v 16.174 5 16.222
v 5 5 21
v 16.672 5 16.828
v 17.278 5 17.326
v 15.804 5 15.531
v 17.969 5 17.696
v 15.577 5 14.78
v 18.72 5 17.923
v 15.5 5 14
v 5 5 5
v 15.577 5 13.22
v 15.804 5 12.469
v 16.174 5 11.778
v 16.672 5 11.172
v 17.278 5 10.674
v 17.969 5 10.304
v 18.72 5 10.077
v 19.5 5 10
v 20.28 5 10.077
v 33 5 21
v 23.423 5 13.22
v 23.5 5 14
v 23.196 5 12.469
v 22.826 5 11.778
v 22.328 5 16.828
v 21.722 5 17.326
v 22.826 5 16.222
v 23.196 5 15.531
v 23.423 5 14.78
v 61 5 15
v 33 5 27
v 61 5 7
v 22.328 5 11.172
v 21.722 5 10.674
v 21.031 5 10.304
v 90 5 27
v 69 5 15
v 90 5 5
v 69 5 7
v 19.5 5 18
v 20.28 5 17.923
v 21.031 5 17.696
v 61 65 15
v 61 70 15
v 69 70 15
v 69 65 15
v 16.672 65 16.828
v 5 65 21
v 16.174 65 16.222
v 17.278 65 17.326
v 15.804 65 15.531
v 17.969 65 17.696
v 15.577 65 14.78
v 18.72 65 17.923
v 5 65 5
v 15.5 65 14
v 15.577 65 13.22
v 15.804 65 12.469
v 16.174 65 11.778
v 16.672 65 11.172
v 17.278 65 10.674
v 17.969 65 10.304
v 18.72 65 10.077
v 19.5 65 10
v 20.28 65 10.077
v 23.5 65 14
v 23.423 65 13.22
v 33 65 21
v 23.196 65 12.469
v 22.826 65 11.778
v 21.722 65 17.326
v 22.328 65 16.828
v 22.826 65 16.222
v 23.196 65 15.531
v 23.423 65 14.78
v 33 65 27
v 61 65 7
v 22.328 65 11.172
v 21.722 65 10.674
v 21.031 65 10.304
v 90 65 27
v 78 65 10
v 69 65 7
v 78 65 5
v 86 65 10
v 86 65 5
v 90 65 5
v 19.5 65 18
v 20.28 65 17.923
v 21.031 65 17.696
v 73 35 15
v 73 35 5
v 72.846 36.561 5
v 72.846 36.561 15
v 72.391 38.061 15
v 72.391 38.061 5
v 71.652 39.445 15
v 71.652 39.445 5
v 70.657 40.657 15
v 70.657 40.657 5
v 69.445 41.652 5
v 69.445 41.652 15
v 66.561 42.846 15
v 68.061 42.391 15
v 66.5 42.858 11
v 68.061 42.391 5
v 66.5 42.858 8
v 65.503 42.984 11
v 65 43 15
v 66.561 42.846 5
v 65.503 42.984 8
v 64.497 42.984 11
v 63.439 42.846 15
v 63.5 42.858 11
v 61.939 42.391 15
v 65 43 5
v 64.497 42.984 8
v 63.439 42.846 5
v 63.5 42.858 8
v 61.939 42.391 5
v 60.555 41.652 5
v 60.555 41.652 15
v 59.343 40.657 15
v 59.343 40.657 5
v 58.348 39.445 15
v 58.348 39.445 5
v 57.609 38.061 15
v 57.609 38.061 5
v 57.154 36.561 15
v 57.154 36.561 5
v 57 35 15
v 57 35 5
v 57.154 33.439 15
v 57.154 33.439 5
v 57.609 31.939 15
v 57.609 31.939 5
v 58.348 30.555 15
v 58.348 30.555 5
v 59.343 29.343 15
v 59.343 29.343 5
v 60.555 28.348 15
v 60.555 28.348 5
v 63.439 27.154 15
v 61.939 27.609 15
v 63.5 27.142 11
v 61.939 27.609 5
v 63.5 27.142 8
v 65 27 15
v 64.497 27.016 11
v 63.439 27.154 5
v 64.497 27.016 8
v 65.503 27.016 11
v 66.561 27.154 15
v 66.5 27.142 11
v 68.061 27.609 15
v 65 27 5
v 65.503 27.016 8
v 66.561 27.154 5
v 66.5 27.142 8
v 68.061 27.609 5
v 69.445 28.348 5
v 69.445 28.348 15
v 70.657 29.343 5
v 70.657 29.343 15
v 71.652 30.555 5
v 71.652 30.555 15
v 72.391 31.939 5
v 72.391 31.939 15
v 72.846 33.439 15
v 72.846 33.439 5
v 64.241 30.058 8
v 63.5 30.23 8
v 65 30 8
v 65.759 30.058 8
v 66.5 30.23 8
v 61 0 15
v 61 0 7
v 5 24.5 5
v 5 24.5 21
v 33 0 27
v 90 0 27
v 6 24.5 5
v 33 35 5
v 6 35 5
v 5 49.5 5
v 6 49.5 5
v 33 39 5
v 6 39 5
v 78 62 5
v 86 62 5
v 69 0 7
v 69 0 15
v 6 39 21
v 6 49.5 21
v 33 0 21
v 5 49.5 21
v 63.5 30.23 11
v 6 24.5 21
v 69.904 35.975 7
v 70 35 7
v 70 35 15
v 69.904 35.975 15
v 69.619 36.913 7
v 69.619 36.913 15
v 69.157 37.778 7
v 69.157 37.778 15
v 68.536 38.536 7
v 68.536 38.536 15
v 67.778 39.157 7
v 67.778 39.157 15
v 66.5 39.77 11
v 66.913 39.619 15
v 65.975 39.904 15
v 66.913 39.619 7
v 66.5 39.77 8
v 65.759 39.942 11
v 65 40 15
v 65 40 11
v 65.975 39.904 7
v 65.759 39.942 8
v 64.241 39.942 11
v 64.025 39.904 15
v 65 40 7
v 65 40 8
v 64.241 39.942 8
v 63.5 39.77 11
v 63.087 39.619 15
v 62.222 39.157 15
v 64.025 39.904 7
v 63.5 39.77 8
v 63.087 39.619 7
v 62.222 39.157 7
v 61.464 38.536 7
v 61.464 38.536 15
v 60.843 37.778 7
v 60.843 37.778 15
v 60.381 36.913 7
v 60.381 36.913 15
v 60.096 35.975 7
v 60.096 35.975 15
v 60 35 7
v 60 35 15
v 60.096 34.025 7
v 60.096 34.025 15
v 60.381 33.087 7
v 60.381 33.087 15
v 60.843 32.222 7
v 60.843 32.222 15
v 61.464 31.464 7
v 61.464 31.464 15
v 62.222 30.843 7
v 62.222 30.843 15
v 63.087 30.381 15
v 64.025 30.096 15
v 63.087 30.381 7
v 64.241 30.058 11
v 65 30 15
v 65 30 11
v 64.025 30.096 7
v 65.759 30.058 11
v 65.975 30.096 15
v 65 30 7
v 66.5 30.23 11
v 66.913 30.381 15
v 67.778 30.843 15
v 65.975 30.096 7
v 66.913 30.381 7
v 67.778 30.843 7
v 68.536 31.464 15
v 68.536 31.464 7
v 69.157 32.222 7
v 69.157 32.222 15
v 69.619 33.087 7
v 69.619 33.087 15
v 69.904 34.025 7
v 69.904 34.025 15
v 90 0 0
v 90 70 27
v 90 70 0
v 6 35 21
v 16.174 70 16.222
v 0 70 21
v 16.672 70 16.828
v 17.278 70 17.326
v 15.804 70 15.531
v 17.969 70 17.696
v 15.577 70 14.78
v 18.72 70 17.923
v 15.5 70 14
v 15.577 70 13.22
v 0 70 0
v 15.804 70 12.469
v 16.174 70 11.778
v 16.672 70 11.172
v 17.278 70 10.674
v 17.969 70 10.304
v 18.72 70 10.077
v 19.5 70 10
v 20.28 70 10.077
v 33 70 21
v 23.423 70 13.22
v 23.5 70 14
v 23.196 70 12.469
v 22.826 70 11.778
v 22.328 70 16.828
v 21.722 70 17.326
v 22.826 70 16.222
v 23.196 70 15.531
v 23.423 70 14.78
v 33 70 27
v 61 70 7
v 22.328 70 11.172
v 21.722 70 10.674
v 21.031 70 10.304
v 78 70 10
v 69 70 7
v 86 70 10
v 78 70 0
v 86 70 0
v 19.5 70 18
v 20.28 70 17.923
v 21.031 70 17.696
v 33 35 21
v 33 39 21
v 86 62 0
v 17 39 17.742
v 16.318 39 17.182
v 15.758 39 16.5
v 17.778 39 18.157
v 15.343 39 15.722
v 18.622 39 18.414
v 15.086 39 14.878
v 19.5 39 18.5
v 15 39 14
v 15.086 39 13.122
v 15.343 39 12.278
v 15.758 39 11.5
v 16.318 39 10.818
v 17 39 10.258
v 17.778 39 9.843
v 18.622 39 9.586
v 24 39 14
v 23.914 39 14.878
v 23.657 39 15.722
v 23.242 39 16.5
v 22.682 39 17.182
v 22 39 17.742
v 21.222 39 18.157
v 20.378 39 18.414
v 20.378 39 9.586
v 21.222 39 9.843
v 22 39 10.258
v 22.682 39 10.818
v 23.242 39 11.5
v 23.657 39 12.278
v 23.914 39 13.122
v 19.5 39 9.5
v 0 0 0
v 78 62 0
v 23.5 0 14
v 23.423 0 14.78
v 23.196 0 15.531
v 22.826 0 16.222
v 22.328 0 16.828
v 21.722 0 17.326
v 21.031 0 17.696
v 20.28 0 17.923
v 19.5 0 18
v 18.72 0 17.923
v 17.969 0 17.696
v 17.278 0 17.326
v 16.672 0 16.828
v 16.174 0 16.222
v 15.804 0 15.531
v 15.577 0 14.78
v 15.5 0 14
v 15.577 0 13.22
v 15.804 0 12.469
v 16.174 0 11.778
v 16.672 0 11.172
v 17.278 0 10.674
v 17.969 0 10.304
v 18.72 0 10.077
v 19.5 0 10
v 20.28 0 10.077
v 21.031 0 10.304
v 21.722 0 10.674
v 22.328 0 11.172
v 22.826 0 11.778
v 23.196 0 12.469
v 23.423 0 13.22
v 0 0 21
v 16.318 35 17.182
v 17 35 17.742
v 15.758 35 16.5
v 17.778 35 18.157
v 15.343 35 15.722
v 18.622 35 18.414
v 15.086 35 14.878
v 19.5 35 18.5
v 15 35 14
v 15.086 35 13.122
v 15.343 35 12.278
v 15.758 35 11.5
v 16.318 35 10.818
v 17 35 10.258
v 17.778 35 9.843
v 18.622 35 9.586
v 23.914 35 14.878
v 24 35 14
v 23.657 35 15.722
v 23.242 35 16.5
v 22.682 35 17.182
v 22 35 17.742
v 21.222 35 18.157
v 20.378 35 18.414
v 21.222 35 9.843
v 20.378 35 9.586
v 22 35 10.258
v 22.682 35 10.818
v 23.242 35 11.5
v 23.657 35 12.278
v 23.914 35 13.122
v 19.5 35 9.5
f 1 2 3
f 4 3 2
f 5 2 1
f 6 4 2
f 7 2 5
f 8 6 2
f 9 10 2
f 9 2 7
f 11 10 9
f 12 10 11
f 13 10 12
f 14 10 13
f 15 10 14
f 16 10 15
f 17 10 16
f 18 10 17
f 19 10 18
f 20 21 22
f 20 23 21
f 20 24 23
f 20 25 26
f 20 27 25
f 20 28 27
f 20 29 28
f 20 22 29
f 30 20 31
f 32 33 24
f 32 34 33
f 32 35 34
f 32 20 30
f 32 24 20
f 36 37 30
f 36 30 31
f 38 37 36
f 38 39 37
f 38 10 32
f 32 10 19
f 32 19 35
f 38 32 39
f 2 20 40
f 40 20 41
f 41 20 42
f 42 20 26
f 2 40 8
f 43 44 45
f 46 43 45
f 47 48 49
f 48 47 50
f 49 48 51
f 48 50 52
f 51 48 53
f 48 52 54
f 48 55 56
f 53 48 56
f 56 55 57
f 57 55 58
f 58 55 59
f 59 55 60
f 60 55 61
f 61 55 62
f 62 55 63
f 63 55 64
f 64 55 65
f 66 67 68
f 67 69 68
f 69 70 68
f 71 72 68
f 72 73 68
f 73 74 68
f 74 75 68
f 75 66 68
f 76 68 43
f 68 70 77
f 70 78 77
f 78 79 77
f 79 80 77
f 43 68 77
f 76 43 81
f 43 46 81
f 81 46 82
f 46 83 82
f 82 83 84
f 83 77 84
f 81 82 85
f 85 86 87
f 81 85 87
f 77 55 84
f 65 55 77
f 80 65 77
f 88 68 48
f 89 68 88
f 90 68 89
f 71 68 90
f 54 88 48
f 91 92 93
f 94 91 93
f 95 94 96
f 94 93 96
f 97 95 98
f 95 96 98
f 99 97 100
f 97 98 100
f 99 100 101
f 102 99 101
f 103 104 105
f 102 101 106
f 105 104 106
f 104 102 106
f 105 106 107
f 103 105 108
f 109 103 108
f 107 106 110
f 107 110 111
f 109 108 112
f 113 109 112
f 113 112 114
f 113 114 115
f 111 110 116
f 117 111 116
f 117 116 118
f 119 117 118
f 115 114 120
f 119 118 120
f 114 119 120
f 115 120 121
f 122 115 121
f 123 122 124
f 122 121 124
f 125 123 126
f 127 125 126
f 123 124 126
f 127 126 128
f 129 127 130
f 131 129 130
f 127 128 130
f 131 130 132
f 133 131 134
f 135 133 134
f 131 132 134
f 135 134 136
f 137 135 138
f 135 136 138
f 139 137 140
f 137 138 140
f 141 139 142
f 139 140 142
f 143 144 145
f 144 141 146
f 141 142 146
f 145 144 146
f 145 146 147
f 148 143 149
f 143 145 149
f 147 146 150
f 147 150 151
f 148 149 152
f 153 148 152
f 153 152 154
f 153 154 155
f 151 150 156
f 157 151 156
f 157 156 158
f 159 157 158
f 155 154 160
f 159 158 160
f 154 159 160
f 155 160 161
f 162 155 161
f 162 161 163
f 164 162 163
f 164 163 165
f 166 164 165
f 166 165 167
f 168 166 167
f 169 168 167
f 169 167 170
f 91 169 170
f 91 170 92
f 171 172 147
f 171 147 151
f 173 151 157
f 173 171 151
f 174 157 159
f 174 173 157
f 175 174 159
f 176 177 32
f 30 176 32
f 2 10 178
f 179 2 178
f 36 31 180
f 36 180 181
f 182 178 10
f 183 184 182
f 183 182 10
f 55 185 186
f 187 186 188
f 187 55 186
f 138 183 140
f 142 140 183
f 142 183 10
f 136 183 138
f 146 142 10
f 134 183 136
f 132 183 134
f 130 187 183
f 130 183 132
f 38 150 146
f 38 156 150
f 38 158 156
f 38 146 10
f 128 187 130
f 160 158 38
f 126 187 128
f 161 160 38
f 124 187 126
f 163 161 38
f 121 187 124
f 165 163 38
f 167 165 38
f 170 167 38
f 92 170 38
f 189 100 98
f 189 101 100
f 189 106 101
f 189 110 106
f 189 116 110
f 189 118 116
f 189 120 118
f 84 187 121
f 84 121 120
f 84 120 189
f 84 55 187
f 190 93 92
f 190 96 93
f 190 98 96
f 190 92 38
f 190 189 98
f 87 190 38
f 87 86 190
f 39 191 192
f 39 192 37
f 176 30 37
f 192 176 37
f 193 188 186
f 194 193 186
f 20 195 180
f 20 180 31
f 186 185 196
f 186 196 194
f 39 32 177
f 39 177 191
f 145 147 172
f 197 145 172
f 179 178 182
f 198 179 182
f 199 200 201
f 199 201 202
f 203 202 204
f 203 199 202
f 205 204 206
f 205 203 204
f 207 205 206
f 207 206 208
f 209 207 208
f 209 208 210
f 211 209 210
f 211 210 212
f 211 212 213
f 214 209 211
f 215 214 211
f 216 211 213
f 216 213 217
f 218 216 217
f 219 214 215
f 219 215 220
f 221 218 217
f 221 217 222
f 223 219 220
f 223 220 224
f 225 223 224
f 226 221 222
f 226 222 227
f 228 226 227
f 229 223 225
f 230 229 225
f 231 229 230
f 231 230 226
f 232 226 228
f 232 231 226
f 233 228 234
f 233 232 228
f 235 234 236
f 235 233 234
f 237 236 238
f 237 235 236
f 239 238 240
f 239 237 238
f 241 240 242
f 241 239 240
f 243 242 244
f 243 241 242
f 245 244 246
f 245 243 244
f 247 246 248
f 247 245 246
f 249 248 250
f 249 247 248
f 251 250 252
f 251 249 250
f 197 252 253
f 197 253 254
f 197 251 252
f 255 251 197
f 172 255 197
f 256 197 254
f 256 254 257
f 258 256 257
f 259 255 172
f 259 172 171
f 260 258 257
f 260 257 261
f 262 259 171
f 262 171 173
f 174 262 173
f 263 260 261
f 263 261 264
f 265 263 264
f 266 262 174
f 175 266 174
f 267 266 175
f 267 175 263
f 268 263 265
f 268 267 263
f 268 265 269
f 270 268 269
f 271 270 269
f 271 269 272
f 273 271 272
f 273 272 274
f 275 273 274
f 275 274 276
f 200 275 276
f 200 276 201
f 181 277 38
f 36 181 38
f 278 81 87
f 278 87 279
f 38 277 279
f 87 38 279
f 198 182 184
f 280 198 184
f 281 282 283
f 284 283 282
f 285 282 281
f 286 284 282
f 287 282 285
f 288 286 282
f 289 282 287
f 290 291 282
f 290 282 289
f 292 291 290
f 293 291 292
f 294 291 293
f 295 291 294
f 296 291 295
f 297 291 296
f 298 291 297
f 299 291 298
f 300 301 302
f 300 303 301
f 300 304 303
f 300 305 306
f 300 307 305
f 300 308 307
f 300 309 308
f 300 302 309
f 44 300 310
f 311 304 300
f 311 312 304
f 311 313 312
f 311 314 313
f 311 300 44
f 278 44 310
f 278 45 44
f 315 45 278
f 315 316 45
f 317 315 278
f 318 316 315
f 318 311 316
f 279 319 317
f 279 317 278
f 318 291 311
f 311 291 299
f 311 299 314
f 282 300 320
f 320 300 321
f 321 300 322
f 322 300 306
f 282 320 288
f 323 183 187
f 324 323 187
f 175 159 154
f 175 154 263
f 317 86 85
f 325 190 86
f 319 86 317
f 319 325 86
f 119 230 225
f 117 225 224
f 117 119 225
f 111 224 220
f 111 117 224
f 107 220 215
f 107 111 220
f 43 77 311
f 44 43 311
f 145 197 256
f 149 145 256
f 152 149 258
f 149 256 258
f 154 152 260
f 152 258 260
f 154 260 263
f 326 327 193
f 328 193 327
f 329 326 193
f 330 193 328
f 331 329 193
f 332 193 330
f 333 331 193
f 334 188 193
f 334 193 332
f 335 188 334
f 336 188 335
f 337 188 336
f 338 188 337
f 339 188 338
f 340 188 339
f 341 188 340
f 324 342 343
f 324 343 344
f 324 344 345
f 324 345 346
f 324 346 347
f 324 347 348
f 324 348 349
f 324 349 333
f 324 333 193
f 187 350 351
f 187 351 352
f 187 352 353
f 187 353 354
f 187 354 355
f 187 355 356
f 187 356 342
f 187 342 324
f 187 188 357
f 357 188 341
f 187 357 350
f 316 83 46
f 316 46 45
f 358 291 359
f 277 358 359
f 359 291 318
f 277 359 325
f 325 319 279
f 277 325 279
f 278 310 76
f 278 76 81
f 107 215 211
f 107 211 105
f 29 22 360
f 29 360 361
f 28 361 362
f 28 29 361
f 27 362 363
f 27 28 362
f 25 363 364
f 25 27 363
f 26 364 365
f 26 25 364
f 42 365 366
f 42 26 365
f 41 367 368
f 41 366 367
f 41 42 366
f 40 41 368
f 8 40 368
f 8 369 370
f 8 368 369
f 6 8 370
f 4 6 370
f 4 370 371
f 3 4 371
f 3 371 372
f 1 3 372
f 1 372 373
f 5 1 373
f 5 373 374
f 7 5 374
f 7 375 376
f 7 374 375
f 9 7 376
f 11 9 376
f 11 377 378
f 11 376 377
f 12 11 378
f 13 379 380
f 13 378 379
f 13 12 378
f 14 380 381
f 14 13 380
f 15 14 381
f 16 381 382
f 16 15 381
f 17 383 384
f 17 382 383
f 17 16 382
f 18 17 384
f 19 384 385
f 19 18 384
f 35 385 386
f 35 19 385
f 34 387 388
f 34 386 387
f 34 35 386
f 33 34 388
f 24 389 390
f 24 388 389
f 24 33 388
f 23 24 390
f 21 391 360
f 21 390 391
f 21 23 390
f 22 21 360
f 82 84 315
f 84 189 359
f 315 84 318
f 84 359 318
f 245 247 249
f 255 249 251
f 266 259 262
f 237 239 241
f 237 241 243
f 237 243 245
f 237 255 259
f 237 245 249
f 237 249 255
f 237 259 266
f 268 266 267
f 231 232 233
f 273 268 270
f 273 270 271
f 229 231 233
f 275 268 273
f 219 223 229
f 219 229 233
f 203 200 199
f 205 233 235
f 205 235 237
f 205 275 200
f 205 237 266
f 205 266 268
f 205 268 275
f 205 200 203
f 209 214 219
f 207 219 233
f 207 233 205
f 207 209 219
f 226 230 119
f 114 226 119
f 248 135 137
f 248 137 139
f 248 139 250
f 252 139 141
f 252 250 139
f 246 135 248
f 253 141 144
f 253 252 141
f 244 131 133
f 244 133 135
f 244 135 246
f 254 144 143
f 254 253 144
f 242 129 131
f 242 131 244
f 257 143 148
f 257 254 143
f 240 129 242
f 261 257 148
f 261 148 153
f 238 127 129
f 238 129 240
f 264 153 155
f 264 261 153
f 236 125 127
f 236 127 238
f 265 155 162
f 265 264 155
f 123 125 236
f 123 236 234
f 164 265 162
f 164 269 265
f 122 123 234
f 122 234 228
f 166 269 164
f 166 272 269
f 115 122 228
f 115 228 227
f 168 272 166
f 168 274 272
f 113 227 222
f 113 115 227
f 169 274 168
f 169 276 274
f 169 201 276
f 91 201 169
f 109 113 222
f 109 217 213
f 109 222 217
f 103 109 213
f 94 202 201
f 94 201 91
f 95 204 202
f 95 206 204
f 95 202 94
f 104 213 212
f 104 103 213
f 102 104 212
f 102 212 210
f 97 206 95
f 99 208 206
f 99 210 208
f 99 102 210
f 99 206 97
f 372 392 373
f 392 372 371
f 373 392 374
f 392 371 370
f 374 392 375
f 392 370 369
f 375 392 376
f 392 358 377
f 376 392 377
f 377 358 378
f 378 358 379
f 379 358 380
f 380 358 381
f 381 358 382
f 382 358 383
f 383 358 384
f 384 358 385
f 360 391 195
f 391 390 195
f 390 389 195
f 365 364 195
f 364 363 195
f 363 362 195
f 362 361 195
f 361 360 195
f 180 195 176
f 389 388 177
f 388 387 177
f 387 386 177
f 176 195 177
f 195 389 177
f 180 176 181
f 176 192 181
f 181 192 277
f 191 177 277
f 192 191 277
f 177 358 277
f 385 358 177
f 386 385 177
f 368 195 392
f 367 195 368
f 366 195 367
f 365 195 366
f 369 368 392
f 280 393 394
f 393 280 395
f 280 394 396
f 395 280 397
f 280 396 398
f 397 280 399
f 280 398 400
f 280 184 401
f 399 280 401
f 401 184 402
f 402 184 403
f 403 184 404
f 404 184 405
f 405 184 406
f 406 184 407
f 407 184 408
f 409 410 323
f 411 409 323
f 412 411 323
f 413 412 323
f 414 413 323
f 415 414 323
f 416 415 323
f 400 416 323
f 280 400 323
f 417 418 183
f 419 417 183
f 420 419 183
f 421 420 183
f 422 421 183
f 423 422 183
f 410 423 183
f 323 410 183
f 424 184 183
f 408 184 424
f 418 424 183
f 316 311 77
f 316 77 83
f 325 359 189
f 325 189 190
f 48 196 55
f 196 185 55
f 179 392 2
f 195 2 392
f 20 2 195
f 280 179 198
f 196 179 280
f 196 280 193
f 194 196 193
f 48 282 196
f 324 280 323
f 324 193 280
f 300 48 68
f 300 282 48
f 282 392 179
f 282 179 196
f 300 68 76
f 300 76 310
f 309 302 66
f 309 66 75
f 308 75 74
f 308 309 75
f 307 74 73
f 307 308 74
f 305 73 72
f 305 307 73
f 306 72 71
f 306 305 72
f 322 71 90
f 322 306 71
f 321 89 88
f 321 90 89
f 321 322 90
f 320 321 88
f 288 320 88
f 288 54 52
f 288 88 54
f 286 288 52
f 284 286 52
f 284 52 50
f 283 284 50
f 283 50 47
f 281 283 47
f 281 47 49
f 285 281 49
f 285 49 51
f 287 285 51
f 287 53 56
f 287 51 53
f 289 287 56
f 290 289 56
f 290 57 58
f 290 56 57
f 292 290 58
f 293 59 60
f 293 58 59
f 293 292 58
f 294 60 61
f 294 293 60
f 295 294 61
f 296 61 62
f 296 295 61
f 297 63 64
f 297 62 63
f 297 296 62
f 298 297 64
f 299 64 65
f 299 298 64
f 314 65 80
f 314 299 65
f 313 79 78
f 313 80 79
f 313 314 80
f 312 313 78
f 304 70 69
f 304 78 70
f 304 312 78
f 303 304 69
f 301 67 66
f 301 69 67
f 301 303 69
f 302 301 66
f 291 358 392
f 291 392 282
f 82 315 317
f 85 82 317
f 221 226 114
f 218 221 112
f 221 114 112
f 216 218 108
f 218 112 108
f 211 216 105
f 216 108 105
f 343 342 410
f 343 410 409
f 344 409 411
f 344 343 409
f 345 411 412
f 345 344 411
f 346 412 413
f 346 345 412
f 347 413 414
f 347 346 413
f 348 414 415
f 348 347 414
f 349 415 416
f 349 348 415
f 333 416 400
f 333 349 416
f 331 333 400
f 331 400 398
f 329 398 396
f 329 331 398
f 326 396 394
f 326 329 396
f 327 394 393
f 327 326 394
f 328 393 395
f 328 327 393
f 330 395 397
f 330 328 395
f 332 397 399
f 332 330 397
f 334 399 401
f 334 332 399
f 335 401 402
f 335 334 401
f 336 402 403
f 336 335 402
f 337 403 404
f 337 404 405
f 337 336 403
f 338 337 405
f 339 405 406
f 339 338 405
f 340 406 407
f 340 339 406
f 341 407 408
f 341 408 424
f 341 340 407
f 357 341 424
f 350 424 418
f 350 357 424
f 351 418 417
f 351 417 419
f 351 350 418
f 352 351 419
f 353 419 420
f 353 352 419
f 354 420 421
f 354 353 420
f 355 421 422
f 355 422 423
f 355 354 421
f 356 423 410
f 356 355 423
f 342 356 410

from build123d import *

# Parameters (mm, degrees)
BOX020_W          = 33
BOX020_H          = 70
BOX020_DEPTH      = 6
CYLINDER002_R     = 4.5
CYLINDER002_DEPTH = 4
BOX004_W          = 27
BOX004_H          = 4
BOX004_DEPTH      = 18
BOX005_W          = 4
BOX005_H          = 25
BOX005_DEPTH      = 18
BOX001_W          = 85
BOX001_H          = 60
BOX001_DEPTH      = 22
BOX008_W          = 8
BOX008_H          = 8
BOX008_DEPTH      = 10
BOX015_W          = 8
BOX015_H          = 5
BOX015_DEPTH      = 8
BOX016_W          = 8
BOX016_H          = 5
BOX016_DEPTH      = 8
CYLINDER_R        = 4
CYLINDER_DEPTH    = 84
BOX_W             = 90
BOX_H             = 70
BOX_DEPTH         = 27
CYLINDER005_R     = 5
CYLINDER005_DEPTH = 8
BOX009_W          = 3
BOX009_H          = 16
BOX009_DEPTH      = 3
CYLINDER004_R     = 8
CYLINDER004_DEPTH = 10


with BuildPart() as bottompedalhingecutout:
    # Box020 → Box020 (new body)
    with BuildSketch(Plane.XY.offset(21)):
        with Locations((16.5, 35)):
            Rectangle(BOX020_W, BOX020_H)
    extrude(amount=BOX020_DEPTH)


with BuildPart() as potentiometermountinghole:
    # Cylinder002 → Cylinder002 (new body)
    with BuildSketch(Plane(origin=(19.5, 39, 14), x_dir=(1, 0, 0), z_dir=(0, -1, 0))):
        Circle(CYLINDER002_R)
    extrude(amount=CYLINDER002_DEPTH)


with BuildPart() as potentiometerplate:
    # Box004 → Box004 (new body)
    with BuildSketch(Plane(origin=(6, 35, 5), x_dir=(1, 0, 0), z_dir=(0, 0, 1))):
        with Locations((13.5, 2)):
            Rectangle(BOX004_W, BOX004_H)
    extrude(amount=BOX004_DEPTH)


with BuildPart() as potentiometermount:
    # Box005 → Box005 (new body)
    with BuildSketch(Plane(origin=(2, 24.5, 5), x_dir=(1, 0, 0), z_dir=(0, 0, 1))):
        with Locations((2, 12.5)):
            Rectangle(BOX005_W, BOX005_H)
    extrude(amount=BOX005_DEPTH)

    # Fusion002: union PotentiometerPlate
    add(potentiometerplate.part)

    # Cut002: cut PotentiometerMountingHole
    add(potentiometermountinghole.part, mode=Mode.SUBTRACT)


with BuildPart() as bottompedalinsidebody:
    # Box001 → Box001 (new body)
    with BuildSketch(Plane(origin=(5, 5, 5), x_dir=(1, 0, 0), z_dir=(0, 0, 1))):
        with Locations((42.5, 30)):
            Rectangle(BOX001_W, BOX001_H)
    extrude(amount=BOX001_DEPTH)


with BuildPart() as wireholecutout:
    # Box008 → Box008 (new body)
    with BuildSketch(Plane(origin=(78, 62, 0), x_dir=(1, 0, 0), z_dir=(0, 0, 1))):
        with Locations((4, 4)):
            Rectangle(BOX008_W, BOX008_H)
    extrude(amount=BOX008_DEPTH)


with BuildPart() as bottomspringsplitpinhole1:
    # Box015 → Box015 (new body)
    with BuildSketch(Plane(origin=(61, 65, 7), x_dir=(1, 0, 0), z_dir=(0, 0, 1))):
        with Locations((4, 2.5)):
            Rectangle(BOX015_W, BOX015_H)
    extrude(amount=BOX015_DEPTH)


with BuildPart() as bottomspringsplitpinhole2:
    # Box016 → Box016 (new body)
    with BuildSketch(Plane(origin=(61, 0, 7), x_dir=(1, 0, 0), z_dir=(0, 0, 1))):
        with Locations((4, 2.5)):
            Rectangle(BOX016_W, BOX016_H)
    extrude(amount=BOX016_DEPTH)


with BuildPart() as bottompedalcutout:
    # Cylinder → Cylinder (new body)
    with BuildSketch(Plane(origin=(19.5, 77, 14), x_dir=(1, 0, 0), z_dir=(0, -1, 0))):
        Circle(CYLINDER_R)
    extrude(amount=CYLINDER_DEPTH)

    # Fusion: union BottomPedalInsideBody, WireHoleCutOut, BottomSpringSplitPinHole1, BottomSpringSplitPinHole2
    add(bottompedalinsidebody.part)
    add(wireholecutout.part)
    add(bottomspringsplitpinhole1.part)
    add(bottomspringsplitpinhole2.part)


with BuildPart() as pedalbodybottom:
    # Box → Box (new body)
    with BuildSketch(Plane.XY):
        with Locations((45, 35)):
            Rectangle(BOX_W, BOX_H)
    extrude(amount=BOX_DEPTH)

    # Cut: cut BottomPedalCutout
    add(bottompedalcutout.part, mode=Mode.SUBTRACT)


with BuildPart() as bottomspringholeinner:
    # Cylinder005 → Cylinder005 (new body)
    with BuildSketch(Plane(origin=(65, 35, 7), x_dir=(1, 0, 0), z_dir=(0, 0, 1))):
        Circle(CYLINDER005_R)
    extrude(amount=CYLINDER005_DEPTH)


with BuildPart() as bottomspringholecutout:
    # Box009 → Box009 (new body)
    with BuildSketch(Plane(origin=(63.5, 27, 8), x_dir=(1, 0, 0), z_dir=(0, 0, 1))):
        with Locations((1.5, 8)):
            Rectangle(BOX009_W, BOX009_H)
    extrude(amount=BOX009_DEPTH)

    # Fusion004: union BottomSpringHoleInner
    add(bottomspringholeinner.part)


with BuildPart() as bottompedal:
    # Cylinder004 → Cylinder004 (new body)
    with BuildSketch(Plane(origin=(65, 35, 5), x_dir=(1, 0, 0), z_dir=(0, 0, 1))):
        Circle(CYLINDER004_R)
    extrude(amount=CYLINDER004_DEPTH)

    # Cut004: cut BottomSpringHoleCutout
    add(bottomspringholecutout.part, mode=Mode.SUBTRACT)

    # Fusion007: union PotentiometerMount, PedalBodyBottom
    add(potentiometermount.part)
    add(pedalbodybottom.part)

    # Cut008: cut BottomPedalHingeCutout
    add(bottompedalhingecutout.part, mode=Mode.SUBTRACT)


solid = bottompedal.part
